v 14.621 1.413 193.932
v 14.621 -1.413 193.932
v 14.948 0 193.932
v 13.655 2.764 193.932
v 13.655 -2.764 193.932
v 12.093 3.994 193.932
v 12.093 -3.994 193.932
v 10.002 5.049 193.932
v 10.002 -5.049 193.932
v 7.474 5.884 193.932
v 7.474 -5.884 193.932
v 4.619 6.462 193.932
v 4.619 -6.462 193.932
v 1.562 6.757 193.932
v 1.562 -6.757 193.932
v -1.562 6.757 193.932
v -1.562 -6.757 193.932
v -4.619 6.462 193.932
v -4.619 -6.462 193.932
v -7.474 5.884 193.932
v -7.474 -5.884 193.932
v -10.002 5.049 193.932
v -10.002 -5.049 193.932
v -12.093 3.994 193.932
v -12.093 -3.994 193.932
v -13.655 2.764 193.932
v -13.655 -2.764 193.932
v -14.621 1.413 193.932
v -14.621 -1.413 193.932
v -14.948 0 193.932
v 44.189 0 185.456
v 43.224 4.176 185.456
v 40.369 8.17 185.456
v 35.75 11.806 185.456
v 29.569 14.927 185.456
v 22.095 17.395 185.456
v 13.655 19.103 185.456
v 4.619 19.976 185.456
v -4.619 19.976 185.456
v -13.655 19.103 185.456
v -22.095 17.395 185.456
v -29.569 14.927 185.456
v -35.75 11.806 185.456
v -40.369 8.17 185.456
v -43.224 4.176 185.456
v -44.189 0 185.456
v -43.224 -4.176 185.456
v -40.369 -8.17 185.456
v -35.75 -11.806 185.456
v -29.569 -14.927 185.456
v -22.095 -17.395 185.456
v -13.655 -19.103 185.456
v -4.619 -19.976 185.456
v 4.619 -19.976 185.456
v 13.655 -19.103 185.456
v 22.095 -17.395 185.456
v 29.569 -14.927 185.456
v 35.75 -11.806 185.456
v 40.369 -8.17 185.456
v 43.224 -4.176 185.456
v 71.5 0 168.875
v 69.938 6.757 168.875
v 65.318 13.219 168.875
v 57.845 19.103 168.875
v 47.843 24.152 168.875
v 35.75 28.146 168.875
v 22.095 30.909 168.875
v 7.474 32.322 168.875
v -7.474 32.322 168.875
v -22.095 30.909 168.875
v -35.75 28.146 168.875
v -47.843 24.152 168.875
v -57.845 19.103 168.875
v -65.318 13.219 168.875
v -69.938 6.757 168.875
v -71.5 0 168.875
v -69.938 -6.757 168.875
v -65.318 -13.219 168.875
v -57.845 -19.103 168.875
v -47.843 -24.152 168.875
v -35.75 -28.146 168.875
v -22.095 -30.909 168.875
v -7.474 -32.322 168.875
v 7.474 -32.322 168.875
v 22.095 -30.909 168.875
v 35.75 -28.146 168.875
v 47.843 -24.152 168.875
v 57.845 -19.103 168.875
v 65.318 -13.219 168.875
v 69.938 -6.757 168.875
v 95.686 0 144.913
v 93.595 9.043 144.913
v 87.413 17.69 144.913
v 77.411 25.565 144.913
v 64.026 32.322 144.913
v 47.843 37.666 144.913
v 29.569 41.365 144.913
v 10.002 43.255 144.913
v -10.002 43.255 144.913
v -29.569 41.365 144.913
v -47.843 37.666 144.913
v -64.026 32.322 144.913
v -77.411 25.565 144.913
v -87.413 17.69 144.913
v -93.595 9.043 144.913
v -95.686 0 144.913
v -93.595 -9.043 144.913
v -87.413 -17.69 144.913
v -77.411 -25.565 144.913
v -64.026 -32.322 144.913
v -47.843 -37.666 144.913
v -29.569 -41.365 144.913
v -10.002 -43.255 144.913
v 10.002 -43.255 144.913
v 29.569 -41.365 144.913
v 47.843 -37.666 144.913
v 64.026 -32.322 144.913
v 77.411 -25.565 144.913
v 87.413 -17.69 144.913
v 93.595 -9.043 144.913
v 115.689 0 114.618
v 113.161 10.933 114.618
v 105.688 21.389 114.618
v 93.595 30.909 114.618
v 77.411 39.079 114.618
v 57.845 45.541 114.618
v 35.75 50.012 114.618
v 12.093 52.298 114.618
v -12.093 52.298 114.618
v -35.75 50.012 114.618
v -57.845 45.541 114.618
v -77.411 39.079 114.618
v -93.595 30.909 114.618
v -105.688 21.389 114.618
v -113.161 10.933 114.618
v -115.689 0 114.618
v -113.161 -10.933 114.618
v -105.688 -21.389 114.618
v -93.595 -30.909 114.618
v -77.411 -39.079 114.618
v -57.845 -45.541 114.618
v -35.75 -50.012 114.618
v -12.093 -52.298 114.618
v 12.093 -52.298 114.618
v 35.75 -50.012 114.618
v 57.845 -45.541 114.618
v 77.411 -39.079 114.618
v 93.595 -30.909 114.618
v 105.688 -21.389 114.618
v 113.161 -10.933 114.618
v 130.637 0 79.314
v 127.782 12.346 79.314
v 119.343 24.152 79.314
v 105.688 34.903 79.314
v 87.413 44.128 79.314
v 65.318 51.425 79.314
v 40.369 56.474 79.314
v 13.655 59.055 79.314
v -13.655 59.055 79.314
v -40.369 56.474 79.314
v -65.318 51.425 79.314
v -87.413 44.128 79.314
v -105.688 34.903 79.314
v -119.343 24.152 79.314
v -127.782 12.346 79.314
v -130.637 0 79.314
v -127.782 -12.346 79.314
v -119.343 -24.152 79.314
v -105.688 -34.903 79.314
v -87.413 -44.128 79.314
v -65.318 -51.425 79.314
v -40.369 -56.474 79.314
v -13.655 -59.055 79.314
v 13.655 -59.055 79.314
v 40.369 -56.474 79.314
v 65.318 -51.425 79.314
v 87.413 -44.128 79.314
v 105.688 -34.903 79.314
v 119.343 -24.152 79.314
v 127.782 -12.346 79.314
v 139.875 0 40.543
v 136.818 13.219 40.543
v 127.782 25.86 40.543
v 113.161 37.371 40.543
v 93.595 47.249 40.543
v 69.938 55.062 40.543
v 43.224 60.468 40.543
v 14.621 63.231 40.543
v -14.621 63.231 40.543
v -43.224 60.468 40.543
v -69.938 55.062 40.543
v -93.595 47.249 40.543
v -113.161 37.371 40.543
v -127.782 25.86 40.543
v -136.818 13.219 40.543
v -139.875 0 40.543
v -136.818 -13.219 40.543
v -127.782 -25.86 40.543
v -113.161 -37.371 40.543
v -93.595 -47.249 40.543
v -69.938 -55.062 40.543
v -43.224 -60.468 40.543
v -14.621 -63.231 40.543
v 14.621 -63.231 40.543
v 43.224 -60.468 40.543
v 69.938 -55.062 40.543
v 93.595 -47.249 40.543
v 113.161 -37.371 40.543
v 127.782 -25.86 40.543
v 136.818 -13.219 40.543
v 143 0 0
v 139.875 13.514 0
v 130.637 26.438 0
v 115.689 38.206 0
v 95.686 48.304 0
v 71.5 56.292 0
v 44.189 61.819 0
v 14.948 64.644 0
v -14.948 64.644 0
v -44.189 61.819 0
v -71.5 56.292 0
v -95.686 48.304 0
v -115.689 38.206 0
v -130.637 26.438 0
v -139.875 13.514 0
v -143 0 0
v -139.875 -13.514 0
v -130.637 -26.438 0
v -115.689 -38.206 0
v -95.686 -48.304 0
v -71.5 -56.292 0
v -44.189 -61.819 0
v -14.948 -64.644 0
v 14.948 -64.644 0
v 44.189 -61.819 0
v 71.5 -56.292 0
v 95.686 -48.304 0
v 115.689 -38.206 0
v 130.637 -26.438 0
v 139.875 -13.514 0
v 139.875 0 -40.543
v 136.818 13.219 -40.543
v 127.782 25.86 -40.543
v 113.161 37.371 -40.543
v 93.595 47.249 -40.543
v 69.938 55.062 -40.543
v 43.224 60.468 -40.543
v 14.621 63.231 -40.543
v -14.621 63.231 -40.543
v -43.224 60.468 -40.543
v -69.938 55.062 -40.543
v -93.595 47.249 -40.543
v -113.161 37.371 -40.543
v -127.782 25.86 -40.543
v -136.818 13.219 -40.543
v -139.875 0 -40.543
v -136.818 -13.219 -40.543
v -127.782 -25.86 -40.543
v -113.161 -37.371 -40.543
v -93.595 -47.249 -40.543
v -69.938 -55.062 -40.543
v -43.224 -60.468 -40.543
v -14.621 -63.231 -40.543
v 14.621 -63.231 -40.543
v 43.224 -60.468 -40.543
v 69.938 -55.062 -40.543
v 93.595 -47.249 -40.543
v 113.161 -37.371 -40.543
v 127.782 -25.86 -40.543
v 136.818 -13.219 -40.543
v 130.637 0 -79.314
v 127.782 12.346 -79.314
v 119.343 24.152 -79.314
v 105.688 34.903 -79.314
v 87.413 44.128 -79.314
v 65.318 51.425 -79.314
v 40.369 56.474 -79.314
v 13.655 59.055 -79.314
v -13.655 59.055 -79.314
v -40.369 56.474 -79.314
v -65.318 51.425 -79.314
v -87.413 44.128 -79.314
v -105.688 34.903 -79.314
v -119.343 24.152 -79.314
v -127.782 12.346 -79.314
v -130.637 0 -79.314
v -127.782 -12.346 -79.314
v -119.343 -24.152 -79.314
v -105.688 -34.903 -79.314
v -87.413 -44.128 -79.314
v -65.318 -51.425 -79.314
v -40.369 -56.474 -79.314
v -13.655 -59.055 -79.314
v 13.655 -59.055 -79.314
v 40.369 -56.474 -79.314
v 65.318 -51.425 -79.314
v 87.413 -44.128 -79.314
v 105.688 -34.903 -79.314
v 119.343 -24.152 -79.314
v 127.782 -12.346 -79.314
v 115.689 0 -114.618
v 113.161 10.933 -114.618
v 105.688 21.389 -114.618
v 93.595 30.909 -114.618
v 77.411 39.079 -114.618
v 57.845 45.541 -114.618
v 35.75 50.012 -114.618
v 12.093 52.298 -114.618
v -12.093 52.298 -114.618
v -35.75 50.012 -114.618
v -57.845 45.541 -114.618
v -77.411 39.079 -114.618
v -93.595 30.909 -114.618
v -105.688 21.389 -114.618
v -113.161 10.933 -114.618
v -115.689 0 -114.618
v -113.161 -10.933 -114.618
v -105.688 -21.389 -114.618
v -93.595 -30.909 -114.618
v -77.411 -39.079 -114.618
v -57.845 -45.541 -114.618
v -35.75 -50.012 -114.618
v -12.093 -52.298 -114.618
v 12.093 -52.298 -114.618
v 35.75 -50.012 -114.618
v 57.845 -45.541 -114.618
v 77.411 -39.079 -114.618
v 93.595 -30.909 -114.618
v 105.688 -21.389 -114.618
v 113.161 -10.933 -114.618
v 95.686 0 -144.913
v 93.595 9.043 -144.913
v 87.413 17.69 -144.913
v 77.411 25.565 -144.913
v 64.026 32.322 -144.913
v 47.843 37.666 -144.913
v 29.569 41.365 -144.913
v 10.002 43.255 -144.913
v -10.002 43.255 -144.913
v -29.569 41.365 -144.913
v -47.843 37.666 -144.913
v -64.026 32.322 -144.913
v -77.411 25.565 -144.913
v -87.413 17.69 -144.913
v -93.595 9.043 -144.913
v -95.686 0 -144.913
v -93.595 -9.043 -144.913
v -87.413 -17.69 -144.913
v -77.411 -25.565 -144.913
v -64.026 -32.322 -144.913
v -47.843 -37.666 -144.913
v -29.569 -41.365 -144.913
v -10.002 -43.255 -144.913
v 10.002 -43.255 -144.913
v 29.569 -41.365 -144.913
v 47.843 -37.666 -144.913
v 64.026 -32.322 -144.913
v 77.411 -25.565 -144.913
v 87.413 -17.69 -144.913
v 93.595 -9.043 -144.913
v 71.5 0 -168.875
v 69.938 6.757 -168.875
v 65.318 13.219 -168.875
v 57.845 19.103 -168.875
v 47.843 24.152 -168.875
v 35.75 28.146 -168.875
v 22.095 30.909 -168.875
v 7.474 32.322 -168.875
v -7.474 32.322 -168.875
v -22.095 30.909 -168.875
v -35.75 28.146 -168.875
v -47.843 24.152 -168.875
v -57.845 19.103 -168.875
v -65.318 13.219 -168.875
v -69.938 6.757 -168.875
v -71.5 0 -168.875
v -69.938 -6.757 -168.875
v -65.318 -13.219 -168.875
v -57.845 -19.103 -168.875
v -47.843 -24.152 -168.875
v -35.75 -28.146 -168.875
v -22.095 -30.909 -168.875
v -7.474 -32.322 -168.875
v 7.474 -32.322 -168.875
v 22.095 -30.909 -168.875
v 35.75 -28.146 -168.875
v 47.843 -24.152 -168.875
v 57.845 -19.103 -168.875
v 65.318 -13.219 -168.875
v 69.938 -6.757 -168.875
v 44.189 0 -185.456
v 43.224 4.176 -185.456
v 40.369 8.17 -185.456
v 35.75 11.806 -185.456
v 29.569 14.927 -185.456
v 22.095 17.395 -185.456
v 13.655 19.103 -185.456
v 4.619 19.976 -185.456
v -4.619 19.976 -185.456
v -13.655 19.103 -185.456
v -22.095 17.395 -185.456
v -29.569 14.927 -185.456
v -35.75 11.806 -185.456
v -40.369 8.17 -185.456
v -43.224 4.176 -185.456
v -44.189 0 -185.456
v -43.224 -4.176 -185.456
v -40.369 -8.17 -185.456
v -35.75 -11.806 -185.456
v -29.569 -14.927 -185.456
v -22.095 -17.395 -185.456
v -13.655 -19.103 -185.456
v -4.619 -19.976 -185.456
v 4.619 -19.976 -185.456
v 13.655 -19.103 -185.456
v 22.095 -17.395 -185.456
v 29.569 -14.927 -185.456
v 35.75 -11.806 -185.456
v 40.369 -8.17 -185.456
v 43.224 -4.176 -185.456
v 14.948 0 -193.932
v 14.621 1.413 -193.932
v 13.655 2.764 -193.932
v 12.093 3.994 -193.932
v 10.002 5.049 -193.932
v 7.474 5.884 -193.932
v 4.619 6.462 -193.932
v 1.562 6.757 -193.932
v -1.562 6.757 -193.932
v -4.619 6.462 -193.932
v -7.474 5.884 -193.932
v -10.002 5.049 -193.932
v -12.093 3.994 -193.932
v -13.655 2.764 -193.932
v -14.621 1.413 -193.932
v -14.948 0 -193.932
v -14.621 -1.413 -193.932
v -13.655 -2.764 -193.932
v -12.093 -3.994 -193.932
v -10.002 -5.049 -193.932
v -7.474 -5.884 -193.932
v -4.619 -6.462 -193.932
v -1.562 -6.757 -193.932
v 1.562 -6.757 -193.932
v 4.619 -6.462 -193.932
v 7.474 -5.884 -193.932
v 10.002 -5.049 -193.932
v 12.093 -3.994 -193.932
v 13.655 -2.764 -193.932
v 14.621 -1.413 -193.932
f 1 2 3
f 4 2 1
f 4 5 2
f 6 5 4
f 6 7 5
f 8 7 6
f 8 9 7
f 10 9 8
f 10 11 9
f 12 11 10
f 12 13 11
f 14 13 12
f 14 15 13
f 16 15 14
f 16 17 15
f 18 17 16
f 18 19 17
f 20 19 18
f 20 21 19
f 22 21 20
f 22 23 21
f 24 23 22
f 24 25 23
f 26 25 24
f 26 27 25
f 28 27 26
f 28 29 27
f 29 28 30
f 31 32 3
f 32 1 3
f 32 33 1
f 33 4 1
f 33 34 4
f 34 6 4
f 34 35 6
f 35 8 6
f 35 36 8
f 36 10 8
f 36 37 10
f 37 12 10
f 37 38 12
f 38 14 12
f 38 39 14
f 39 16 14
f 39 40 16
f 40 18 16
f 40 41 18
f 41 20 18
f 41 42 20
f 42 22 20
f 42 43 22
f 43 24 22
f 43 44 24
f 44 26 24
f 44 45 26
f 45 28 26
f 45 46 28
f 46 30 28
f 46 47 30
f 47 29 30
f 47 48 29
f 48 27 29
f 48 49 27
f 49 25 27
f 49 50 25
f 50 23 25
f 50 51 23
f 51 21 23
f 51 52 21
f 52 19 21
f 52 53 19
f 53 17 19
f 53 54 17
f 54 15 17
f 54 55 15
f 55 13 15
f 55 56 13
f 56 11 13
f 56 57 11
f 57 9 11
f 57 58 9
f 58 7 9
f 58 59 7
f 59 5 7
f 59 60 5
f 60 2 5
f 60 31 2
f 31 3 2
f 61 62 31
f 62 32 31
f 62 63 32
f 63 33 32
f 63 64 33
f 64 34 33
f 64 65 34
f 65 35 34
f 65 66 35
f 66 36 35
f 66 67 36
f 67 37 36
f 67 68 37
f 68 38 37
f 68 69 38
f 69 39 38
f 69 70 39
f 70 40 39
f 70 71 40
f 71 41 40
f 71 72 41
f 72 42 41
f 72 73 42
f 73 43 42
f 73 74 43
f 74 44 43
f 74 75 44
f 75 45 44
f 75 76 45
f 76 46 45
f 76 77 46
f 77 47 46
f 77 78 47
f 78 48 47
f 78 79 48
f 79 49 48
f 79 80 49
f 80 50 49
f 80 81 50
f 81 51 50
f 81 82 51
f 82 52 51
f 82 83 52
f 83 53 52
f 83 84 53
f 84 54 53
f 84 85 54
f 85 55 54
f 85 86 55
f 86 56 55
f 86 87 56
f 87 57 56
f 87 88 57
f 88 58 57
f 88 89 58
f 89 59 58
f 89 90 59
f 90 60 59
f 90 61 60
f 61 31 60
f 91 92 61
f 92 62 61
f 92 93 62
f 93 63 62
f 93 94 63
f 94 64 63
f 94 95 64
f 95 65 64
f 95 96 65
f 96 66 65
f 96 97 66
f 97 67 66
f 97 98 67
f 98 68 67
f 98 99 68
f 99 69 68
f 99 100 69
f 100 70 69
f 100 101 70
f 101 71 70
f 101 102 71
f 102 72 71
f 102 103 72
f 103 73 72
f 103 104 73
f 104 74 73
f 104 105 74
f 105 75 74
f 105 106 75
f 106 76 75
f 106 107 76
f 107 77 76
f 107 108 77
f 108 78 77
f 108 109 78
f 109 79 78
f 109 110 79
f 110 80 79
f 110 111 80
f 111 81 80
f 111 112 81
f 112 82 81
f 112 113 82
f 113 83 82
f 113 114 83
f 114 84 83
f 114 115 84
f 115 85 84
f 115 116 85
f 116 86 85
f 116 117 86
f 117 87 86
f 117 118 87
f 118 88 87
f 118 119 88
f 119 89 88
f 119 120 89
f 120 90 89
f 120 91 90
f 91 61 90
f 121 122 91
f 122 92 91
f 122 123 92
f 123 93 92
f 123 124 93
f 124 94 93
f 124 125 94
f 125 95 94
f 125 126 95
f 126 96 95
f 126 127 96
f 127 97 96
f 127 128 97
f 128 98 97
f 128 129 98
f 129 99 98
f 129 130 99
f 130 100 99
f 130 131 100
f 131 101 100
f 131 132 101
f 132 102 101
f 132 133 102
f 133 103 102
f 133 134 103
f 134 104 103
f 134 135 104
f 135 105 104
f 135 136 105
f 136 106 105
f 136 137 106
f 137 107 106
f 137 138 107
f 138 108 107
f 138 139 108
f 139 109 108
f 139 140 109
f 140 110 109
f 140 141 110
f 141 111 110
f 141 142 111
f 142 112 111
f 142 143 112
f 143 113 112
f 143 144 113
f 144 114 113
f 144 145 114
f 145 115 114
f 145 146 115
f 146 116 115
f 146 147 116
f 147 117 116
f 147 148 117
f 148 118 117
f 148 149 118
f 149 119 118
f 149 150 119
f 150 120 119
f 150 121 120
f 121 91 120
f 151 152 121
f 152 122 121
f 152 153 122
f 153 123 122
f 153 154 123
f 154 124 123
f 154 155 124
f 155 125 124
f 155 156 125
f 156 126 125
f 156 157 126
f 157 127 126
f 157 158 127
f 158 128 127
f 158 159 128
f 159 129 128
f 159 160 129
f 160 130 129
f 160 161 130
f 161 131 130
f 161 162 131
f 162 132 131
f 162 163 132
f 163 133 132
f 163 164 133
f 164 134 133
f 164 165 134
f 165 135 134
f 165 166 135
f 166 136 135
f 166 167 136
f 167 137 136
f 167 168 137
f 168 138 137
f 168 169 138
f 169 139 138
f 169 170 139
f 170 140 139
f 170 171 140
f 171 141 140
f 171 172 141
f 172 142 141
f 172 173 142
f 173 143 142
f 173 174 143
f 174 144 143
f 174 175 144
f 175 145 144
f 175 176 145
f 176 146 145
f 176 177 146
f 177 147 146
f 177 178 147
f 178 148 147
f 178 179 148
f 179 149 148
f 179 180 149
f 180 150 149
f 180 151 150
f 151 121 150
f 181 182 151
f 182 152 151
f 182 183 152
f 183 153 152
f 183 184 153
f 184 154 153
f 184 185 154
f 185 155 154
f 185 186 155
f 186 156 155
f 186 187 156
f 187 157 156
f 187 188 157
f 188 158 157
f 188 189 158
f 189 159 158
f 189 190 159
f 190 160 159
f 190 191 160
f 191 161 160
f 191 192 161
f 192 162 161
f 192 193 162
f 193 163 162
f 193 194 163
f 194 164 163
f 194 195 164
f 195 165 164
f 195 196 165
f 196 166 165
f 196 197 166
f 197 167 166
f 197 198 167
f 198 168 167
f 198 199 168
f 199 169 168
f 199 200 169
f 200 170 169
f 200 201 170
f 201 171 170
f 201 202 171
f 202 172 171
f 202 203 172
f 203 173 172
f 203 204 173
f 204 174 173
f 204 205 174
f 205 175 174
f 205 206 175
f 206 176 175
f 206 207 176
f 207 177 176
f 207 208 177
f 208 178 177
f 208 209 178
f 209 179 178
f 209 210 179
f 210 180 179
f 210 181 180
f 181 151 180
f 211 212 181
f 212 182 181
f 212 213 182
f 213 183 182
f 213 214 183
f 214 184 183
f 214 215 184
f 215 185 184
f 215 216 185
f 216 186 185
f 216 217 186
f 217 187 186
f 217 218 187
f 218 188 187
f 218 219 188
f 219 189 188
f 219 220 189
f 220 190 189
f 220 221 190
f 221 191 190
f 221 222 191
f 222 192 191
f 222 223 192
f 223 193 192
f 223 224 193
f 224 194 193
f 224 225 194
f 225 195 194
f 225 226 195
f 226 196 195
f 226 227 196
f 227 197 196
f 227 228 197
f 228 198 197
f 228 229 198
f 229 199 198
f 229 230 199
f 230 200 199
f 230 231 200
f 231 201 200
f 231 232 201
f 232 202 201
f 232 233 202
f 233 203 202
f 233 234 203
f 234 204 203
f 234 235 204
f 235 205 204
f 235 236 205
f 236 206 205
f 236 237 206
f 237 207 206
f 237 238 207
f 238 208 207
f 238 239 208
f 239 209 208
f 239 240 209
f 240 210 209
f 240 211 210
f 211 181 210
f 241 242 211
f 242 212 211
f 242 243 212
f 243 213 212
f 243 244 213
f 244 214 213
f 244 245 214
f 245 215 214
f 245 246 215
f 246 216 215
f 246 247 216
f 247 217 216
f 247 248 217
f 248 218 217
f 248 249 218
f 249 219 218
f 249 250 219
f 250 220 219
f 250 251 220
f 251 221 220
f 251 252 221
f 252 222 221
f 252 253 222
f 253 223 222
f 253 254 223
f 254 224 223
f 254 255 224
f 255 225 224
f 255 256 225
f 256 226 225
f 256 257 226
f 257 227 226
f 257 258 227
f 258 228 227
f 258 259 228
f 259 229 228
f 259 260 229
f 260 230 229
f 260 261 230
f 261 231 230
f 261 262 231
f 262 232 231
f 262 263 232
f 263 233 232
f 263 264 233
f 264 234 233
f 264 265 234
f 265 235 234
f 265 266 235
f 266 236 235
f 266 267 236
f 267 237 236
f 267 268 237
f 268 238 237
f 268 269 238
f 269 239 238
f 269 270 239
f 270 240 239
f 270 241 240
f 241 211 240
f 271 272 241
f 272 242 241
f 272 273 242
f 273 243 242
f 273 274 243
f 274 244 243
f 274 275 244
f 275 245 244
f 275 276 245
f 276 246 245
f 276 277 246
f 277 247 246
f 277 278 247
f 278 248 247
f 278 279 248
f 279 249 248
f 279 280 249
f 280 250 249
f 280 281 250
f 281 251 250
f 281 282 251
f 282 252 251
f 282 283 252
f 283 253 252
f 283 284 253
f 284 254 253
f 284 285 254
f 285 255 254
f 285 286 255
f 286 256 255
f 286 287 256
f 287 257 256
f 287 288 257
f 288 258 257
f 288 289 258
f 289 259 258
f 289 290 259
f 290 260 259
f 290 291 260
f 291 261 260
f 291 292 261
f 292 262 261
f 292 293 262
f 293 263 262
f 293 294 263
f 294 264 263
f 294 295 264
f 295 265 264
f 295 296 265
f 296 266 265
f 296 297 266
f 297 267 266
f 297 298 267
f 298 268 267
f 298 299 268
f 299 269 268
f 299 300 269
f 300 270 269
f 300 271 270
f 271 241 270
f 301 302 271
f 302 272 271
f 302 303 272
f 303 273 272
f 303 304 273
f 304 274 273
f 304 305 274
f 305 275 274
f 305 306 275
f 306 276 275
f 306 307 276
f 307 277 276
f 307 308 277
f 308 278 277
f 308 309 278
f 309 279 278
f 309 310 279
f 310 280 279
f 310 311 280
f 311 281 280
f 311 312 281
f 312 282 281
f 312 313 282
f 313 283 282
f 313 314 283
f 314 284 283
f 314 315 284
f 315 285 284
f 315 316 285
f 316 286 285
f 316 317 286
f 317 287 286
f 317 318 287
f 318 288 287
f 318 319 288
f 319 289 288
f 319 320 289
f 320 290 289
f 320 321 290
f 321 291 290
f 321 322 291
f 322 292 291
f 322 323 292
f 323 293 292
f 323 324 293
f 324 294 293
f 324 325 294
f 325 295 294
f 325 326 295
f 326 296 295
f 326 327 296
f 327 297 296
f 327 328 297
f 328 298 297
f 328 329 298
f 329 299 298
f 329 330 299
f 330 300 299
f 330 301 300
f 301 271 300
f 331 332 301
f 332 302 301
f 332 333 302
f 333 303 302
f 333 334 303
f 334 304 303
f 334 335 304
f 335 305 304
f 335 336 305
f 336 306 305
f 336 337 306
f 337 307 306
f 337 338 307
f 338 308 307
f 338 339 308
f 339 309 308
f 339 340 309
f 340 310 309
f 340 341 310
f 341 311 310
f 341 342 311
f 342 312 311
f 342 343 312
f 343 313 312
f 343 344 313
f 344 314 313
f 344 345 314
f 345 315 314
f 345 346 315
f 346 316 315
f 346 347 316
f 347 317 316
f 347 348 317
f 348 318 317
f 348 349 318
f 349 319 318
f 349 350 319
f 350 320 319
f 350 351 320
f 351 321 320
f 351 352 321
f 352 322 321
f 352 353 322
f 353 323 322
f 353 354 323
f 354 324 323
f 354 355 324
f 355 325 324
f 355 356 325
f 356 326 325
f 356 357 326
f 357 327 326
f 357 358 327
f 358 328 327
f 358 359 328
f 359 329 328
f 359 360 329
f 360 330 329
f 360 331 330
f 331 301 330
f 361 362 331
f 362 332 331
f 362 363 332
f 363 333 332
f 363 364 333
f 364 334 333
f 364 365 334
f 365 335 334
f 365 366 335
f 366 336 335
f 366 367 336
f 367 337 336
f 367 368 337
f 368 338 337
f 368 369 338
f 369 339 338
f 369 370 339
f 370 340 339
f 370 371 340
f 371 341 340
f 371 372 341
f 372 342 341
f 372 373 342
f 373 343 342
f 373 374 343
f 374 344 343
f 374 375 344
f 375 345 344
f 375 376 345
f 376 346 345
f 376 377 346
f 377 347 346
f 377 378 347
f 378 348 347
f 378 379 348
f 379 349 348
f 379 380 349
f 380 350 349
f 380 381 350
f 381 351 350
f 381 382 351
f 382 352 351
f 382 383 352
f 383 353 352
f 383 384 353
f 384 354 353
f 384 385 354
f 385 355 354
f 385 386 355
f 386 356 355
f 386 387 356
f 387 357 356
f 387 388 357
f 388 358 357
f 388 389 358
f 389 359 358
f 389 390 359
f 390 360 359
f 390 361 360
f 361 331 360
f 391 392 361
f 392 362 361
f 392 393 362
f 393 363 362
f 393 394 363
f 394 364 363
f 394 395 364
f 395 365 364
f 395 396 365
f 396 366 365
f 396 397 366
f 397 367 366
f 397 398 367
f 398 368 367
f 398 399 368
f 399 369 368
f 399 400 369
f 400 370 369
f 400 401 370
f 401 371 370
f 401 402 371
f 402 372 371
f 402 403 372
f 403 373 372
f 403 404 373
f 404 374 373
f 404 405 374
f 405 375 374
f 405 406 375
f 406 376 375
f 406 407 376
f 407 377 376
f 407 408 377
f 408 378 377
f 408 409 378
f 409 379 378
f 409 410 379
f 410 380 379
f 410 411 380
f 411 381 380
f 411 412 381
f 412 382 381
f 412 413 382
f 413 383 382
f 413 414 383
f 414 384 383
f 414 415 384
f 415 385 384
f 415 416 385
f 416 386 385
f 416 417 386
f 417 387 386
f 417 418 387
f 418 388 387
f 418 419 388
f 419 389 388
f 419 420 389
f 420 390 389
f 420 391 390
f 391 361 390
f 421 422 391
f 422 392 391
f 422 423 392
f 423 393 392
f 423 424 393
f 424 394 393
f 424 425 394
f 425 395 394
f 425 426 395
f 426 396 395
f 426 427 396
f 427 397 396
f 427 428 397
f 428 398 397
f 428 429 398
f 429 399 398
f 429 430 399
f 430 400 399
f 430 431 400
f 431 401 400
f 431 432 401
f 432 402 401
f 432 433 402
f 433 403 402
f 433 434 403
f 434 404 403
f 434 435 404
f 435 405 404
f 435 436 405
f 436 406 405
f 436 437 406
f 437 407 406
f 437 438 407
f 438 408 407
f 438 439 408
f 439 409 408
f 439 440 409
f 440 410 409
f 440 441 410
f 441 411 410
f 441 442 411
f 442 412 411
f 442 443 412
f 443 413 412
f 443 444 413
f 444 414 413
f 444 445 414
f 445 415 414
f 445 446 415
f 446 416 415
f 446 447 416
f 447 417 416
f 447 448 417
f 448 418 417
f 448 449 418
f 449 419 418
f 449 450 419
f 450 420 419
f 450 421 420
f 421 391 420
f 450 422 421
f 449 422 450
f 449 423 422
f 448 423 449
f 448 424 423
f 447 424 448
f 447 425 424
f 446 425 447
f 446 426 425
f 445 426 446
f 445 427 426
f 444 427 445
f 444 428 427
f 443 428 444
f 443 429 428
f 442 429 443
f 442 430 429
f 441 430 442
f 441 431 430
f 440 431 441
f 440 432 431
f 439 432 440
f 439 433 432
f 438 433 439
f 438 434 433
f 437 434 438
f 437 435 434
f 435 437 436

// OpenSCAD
// Generated by SolidPython 1.0.1 on 2020-07-29 00:46:49


scale(v = [11, 5, 15]) {
	sphere(r = 13);
}
/***********************************************
*********      SolidPython code:      **********
************************************************
 
# import packages: SolidPython
from solid import *
from solid.utils import *
from itertools import chain, combinations, permutations


class Resize:

    def __init__(self, scad_file):
        self.scad_file = scad_file
        #self.scad_file = import_scad(scad_file)
        # cone/cylinder param:
        self.r1 = 0
        self.r2 = 0
        self.h = 0
        # rectangular prism param:
        self.w = 0
        self.l = 0
        # ellipse param:
        self.r = 0

    # import OpenScad code (file name corresponds to shape)


    # classify shape + parameters
    def assign(self, param1, param2, param3):
        if self.scad_file == 'cone.scad':
            self.r1 = param1
            self.r2 = param2
            self.h = param3
        elif self.scad_file == 'cylinder.scad':
            self.r1 = param1
            self.r2 = param2
            self.h = param3
        elif self.scad_file == 'rectangularPrism.scad':
            self.h = param1
            self.l = param2
            self.w = param3
        else:
            self.r = param1
            self.h = param2

    # resize parameters
    def iterate(self):
        x = range(3, 20, 2)
        i = 1
        if self.scad_file == 'cone.scad':
            tempList = list(permutations(x, 2))
            for temp in tempList:
                param1 = temp[0]
                param2 = temp[1]
                filepath = 'produced_scad_files/' + 'cone' + str(param1) + '_' + str(param2) + '_' + '.scad'
                scad_render_to_file(cylinder(h=param1, r1=param2, r2=0), filepath)

        elif self.scad_file == 'cylinder.scad':
            tempList = list(permutations(x, 3))
            for temp in tempList:
                param1 = temp[0]
                param2 = temp[1]
                filepath = 'produced_scad_files/' + 'cylinder' + str(param1) + '_' + str(param2) + '_' + '.scad'
                scad_render_to_file(cylinder(h=param1, r1=param2, r2=param2), filepath)

        elif self.scad_file == 'rectangularPrism.scad':
            tempList = list(permutations(x, 3))
            for temp in tempList:
                param1 = temp[0]
                param2 = temp[1]
                param3 = temp[2]
                filepath = 'produced_scad_files/' + 'rectangularPrism' + str(param1) + '_' + str(param2) + '_' + str(
                    param3) + '.scad'
                scad_render_to_file(cube(size=(param1, param2, param3)), filepath)

        elif self.scad_file == 'ellipse.scad':
            tempList = list(permutations(x, 4))
            for temp in tempList:
                param1 = temp[0]
                param2 = temp[1]
                param3 = temp[2]
                param4 = temp[3]
                filepath = 'produced_scad_files/' + 'ellipse' + str(param1) + '_' + str(param2) + '_' + str(param3) + '_' + str(param4) + '.scad'
                scad_render_to_file(scale([param1, param2, param3])(sphere(r=param4)), filepath)

    def render_to_scadfile(self):
        scad_render_to_file(scad, 'example.scad') 
 
************************************************/
